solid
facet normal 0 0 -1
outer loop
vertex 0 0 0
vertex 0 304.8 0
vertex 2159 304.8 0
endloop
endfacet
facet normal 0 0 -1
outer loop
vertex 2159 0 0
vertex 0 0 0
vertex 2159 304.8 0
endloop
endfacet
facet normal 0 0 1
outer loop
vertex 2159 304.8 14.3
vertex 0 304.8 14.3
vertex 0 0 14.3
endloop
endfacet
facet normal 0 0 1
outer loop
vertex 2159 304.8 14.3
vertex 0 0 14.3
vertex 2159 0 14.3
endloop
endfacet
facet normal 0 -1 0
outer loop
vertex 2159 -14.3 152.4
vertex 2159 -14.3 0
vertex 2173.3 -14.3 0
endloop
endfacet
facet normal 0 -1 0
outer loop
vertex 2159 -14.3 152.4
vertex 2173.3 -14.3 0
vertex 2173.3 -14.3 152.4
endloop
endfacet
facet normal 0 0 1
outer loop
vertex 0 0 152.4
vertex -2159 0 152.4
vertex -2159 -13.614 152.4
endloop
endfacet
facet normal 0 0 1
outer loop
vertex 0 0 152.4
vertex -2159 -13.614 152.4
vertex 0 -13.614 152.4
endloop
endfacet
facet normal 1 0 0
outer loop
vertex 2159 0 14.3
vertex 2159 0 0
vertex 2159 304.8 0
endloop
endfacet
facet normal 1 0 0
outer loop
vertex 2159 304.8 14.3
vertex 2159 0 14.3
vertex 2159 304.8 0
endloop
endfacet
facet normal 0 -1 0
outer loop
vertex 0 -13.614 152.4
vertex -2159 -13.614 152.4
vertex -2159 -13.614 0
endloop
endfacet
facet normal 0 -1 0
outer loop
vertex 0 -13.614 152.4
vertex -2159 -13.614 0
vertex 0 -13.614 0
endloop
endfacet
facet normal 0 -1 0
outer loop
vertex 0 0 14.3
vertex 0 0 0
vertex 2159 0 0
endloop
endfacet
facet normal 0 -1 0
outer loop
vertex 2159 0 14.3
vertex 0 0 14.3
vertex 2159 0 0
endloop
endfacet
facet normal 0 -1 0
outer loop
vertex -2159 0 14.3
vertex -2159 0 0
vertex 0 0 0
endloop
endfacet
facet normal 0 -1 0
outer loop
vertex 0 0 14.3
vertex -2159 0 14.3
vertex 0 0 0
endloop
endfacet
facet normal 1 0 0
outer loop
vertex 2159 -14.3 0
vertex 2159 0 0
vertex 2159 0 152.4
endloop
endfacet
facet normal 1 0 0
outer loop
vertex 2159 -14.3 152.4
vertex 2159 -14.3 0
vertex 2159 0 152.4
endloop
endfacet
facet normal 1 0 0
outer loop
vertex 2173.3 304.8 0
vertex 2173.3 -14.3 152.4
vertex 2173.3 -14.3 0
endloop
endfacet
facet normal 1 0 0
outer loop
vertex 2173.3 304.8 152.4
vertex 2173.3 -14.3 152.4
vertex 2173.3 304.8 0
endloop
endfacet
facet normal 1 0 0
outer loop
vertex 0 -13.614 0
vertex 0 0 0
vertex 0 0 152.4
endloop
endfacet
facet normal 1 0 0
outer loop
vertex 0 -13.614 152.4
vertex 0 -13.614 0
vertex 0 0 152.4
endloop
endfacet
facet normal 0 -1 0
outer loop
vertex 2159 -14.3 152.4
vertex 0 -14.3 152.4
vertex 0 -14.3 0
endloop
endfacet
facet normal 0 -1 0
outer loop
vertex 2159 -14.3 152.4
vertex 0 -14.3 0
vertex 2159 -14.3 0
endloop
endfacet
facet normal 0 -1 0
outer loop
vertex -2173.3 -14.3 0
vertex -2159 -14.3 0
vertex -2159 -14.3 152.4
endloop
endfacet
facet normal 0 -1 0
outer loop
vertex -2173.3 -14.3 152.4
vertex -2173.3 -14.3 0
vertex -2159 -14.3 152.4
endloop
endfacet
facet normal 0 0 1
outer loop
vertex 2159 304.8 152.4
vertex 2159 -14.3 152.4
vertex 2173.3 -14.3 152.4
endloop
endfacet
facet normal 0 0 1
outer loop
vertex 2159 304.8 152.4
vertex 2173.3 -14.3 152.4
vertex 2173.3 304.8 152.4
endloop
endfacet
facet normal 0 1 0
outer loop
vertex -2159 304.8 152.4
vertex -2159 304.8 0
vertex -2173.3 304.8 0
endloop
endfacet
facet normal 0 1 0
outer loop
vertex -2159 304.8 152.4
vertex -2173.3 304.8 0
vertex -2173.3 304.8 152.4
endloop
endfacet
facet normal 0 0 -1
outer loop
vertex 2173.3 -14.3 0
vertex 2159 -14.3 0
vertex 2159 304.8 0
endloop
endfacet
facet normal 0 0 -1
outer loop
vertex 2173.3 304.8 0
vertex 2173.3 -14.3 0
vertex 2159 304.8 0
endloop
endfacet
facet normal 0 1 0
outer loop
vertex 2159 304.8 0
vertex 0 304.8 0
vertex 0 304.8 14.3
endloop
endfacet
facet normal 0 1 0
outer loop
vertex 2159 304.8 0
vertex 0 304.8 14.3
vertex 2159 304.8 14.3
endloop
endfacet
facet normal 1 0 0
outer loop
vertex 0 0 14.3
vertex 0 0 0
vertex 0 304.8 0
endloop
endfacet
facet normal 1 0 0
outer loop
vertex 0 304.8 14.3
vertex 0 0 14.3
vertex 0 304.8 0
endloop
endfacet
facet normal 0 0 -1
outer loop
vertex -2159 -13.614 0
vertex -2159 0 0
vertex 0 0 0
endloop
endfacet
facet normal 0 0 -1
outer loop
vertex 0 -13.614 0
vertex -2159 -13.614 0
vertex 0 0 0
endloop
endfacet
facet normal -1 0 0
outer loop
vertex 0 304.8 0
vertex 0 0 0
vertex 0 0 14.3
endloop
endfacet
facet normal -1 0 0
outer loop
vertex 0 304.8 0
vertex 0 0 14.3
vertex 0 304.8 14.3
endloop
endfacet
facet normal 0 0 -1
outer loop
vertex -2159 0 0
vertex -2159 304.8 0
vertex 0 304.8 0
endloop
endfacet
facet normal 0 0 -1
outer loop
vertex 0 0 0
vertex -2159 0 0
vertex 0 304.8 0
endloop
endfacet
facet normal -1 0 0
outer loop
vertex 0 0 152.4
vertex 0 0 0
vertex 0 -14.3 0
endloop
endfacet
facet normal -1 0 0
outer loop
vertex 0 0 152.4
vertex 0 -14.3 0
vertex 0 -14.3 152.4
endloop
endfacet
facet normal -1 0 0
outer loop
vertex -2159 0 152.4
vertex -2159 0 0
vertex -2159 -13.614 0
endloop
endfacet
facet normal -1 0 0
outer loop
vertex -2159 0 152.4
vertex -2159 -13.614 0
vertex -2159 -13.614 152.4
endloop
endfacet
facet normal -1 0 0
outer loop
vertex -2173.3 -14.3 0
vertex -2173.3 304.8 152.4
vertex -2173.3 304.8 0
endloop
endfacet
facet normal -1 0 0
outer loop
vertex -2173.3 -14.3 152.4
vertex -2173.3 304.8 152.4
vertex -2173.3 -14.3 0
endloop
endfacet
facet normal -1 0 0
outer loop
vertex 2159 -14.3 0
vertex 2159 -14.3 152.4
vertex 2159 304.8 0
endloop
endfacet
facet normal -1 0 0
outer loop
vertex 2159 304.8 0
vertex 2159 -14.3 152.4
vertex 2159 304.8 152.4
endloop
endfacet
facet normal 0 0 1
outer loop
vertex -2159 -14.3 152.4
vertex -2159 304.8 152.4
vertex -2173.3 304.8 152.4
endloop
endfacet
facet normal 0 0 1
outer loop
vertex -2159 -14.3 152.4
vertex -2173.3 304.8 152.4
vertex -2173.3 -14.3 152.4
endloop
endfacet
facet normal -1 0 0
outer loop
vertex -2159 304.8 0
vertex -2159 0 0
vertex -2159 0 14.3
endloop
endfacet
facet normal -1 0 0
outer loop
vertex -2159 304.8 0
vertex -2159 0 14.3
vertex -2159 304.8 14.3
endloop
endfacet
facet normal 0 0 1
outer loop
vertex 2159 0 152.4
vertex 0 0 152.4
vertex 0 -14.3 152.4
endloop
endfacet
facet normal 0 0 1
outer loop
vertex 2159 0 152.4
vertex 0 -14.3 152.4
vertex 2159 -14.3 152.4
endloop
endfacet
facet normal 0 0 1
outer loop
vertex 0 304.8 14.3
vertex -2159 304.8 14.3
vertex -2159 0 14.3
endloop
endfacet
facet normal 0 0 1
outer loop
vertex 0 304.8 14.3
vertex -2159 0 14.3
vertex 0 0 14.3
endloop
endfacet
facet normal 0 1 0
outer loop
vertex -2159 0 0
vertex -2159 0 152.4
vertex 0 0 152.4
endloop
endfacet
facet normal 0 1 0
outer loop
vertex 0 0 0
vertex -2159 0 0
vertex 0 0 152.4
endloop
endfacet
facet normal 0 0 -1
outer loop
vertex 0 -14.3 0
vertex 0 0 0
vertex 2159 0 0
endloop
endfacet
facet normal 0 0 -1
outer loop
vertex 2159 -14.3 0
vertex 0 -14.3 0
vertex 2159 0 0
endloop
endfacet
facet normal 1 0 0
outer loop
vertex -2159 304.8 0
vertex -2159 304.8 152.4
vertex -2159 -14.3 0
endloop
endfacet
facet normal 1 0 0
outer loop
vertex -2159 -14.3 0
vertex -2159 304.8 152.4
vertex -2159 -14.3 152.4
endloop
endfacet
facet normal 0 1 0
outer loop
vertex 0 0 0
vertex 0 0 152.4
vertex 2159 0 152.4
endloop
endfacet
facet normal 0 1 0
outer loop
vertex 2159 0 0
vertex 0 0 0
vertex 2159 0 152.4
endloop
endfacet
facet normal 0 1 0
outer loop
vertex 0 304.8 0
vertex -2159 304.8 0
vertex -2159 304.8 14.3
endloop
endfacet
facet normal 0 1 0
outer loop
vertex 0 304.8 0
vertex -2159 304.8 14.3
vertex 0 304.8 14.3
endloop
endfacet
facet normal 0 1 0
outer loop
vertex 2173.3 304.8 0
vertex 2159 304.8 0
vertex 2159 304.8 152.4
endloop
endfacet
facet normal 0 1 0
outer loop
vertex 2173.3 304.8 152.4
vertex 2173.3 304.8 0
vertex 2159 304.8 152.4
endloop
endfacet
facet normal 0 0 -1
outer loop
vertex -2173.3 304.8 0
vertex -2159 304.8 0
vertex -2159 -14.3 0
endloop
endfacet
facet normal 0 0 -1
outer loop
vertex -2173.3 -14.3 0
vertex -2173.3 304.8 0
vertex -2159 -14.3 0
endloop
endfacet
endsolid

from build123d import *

# Parameters (mm, degrees)
F0_W      = 2159
F0_H      = 304.8
F1_DEPTH  = 14.3002
F2_W      = 2159
F2_H      = 304.8
F3_DEPTH  = 14.3002
F4_W      = 2159
F4_H      = 152.4
F5_DEPTH  = 13.6144
F6_W      = 2159
F6_H      = 152.4
F7_DEPTH  = 14.3002
F8_W      = 319.1002
F8_H      = 152.4
F9_DEPTH  = 14.3002
F10_W     = 319.1002
F10_H     = 152.4
F11_DEPTH = 14.3002


with BuildPart() as f1:
    # F0 (on Top) → F1 (new body)
    with BuildSketch(Plane.XY):
        with Locations((-1079.5, 152.4)):
            Rectangle(F0_W, F0_H)
    extrude(amount=F1_DEPTH)


with BuildPart() as f3:
    # F2 (on Top) → F3 (new body)
    with BuildSketch(Plane.XY):
        with Locations((1079.5, 152.4)):
            Rectangle(F2_W, F2_H)
    extrude(amount=F3_DEPTH)


with BuildPart() as f5:
    # F4 (on face) → F5 (new body)
    with BuildSketch(Plane.XZ):
        with Locations((-1079.5, 76.2)):
            Rectangle(F4_W, F4_H)
    extrude(amount=F5_DEPTH)


with BuildPart() as f7:
    # F6 (on Front) → F7 (new body)
    with BuildSketch(Plane.XZ):
        with Locations((1079.5, 76.2)):
            Rectangle(F6_W, F6_H)
    extrude(amount=F7_DEPTH)


with BuildPart() as f9:
    # F8 (on face) → F9 (new body)
    with BuildSketch(Plane(origin=(-2159, 0, 0), x_dir=(0, -1, 0), z_dir=(-1, 0, 0))):
        with Locations((-145.2499, 76.2)):
            Rectangle(F8_W, F8_H)
    extrude(amount=F9_DEPTH)


with BuildPart() as f11:
    # F10 (on face) → F11 (new body)
    with BuildSketch(Plane.YZ.offset(2159)):
        with Locations((145.2499, 76.2)):
            Rectangle(F10_W, F10_H)
    extrude(amount=F11_DEPTH)


solid = Compound([f1.part, f3.part, f5.part, f7.part, f9.part, f11.part])
